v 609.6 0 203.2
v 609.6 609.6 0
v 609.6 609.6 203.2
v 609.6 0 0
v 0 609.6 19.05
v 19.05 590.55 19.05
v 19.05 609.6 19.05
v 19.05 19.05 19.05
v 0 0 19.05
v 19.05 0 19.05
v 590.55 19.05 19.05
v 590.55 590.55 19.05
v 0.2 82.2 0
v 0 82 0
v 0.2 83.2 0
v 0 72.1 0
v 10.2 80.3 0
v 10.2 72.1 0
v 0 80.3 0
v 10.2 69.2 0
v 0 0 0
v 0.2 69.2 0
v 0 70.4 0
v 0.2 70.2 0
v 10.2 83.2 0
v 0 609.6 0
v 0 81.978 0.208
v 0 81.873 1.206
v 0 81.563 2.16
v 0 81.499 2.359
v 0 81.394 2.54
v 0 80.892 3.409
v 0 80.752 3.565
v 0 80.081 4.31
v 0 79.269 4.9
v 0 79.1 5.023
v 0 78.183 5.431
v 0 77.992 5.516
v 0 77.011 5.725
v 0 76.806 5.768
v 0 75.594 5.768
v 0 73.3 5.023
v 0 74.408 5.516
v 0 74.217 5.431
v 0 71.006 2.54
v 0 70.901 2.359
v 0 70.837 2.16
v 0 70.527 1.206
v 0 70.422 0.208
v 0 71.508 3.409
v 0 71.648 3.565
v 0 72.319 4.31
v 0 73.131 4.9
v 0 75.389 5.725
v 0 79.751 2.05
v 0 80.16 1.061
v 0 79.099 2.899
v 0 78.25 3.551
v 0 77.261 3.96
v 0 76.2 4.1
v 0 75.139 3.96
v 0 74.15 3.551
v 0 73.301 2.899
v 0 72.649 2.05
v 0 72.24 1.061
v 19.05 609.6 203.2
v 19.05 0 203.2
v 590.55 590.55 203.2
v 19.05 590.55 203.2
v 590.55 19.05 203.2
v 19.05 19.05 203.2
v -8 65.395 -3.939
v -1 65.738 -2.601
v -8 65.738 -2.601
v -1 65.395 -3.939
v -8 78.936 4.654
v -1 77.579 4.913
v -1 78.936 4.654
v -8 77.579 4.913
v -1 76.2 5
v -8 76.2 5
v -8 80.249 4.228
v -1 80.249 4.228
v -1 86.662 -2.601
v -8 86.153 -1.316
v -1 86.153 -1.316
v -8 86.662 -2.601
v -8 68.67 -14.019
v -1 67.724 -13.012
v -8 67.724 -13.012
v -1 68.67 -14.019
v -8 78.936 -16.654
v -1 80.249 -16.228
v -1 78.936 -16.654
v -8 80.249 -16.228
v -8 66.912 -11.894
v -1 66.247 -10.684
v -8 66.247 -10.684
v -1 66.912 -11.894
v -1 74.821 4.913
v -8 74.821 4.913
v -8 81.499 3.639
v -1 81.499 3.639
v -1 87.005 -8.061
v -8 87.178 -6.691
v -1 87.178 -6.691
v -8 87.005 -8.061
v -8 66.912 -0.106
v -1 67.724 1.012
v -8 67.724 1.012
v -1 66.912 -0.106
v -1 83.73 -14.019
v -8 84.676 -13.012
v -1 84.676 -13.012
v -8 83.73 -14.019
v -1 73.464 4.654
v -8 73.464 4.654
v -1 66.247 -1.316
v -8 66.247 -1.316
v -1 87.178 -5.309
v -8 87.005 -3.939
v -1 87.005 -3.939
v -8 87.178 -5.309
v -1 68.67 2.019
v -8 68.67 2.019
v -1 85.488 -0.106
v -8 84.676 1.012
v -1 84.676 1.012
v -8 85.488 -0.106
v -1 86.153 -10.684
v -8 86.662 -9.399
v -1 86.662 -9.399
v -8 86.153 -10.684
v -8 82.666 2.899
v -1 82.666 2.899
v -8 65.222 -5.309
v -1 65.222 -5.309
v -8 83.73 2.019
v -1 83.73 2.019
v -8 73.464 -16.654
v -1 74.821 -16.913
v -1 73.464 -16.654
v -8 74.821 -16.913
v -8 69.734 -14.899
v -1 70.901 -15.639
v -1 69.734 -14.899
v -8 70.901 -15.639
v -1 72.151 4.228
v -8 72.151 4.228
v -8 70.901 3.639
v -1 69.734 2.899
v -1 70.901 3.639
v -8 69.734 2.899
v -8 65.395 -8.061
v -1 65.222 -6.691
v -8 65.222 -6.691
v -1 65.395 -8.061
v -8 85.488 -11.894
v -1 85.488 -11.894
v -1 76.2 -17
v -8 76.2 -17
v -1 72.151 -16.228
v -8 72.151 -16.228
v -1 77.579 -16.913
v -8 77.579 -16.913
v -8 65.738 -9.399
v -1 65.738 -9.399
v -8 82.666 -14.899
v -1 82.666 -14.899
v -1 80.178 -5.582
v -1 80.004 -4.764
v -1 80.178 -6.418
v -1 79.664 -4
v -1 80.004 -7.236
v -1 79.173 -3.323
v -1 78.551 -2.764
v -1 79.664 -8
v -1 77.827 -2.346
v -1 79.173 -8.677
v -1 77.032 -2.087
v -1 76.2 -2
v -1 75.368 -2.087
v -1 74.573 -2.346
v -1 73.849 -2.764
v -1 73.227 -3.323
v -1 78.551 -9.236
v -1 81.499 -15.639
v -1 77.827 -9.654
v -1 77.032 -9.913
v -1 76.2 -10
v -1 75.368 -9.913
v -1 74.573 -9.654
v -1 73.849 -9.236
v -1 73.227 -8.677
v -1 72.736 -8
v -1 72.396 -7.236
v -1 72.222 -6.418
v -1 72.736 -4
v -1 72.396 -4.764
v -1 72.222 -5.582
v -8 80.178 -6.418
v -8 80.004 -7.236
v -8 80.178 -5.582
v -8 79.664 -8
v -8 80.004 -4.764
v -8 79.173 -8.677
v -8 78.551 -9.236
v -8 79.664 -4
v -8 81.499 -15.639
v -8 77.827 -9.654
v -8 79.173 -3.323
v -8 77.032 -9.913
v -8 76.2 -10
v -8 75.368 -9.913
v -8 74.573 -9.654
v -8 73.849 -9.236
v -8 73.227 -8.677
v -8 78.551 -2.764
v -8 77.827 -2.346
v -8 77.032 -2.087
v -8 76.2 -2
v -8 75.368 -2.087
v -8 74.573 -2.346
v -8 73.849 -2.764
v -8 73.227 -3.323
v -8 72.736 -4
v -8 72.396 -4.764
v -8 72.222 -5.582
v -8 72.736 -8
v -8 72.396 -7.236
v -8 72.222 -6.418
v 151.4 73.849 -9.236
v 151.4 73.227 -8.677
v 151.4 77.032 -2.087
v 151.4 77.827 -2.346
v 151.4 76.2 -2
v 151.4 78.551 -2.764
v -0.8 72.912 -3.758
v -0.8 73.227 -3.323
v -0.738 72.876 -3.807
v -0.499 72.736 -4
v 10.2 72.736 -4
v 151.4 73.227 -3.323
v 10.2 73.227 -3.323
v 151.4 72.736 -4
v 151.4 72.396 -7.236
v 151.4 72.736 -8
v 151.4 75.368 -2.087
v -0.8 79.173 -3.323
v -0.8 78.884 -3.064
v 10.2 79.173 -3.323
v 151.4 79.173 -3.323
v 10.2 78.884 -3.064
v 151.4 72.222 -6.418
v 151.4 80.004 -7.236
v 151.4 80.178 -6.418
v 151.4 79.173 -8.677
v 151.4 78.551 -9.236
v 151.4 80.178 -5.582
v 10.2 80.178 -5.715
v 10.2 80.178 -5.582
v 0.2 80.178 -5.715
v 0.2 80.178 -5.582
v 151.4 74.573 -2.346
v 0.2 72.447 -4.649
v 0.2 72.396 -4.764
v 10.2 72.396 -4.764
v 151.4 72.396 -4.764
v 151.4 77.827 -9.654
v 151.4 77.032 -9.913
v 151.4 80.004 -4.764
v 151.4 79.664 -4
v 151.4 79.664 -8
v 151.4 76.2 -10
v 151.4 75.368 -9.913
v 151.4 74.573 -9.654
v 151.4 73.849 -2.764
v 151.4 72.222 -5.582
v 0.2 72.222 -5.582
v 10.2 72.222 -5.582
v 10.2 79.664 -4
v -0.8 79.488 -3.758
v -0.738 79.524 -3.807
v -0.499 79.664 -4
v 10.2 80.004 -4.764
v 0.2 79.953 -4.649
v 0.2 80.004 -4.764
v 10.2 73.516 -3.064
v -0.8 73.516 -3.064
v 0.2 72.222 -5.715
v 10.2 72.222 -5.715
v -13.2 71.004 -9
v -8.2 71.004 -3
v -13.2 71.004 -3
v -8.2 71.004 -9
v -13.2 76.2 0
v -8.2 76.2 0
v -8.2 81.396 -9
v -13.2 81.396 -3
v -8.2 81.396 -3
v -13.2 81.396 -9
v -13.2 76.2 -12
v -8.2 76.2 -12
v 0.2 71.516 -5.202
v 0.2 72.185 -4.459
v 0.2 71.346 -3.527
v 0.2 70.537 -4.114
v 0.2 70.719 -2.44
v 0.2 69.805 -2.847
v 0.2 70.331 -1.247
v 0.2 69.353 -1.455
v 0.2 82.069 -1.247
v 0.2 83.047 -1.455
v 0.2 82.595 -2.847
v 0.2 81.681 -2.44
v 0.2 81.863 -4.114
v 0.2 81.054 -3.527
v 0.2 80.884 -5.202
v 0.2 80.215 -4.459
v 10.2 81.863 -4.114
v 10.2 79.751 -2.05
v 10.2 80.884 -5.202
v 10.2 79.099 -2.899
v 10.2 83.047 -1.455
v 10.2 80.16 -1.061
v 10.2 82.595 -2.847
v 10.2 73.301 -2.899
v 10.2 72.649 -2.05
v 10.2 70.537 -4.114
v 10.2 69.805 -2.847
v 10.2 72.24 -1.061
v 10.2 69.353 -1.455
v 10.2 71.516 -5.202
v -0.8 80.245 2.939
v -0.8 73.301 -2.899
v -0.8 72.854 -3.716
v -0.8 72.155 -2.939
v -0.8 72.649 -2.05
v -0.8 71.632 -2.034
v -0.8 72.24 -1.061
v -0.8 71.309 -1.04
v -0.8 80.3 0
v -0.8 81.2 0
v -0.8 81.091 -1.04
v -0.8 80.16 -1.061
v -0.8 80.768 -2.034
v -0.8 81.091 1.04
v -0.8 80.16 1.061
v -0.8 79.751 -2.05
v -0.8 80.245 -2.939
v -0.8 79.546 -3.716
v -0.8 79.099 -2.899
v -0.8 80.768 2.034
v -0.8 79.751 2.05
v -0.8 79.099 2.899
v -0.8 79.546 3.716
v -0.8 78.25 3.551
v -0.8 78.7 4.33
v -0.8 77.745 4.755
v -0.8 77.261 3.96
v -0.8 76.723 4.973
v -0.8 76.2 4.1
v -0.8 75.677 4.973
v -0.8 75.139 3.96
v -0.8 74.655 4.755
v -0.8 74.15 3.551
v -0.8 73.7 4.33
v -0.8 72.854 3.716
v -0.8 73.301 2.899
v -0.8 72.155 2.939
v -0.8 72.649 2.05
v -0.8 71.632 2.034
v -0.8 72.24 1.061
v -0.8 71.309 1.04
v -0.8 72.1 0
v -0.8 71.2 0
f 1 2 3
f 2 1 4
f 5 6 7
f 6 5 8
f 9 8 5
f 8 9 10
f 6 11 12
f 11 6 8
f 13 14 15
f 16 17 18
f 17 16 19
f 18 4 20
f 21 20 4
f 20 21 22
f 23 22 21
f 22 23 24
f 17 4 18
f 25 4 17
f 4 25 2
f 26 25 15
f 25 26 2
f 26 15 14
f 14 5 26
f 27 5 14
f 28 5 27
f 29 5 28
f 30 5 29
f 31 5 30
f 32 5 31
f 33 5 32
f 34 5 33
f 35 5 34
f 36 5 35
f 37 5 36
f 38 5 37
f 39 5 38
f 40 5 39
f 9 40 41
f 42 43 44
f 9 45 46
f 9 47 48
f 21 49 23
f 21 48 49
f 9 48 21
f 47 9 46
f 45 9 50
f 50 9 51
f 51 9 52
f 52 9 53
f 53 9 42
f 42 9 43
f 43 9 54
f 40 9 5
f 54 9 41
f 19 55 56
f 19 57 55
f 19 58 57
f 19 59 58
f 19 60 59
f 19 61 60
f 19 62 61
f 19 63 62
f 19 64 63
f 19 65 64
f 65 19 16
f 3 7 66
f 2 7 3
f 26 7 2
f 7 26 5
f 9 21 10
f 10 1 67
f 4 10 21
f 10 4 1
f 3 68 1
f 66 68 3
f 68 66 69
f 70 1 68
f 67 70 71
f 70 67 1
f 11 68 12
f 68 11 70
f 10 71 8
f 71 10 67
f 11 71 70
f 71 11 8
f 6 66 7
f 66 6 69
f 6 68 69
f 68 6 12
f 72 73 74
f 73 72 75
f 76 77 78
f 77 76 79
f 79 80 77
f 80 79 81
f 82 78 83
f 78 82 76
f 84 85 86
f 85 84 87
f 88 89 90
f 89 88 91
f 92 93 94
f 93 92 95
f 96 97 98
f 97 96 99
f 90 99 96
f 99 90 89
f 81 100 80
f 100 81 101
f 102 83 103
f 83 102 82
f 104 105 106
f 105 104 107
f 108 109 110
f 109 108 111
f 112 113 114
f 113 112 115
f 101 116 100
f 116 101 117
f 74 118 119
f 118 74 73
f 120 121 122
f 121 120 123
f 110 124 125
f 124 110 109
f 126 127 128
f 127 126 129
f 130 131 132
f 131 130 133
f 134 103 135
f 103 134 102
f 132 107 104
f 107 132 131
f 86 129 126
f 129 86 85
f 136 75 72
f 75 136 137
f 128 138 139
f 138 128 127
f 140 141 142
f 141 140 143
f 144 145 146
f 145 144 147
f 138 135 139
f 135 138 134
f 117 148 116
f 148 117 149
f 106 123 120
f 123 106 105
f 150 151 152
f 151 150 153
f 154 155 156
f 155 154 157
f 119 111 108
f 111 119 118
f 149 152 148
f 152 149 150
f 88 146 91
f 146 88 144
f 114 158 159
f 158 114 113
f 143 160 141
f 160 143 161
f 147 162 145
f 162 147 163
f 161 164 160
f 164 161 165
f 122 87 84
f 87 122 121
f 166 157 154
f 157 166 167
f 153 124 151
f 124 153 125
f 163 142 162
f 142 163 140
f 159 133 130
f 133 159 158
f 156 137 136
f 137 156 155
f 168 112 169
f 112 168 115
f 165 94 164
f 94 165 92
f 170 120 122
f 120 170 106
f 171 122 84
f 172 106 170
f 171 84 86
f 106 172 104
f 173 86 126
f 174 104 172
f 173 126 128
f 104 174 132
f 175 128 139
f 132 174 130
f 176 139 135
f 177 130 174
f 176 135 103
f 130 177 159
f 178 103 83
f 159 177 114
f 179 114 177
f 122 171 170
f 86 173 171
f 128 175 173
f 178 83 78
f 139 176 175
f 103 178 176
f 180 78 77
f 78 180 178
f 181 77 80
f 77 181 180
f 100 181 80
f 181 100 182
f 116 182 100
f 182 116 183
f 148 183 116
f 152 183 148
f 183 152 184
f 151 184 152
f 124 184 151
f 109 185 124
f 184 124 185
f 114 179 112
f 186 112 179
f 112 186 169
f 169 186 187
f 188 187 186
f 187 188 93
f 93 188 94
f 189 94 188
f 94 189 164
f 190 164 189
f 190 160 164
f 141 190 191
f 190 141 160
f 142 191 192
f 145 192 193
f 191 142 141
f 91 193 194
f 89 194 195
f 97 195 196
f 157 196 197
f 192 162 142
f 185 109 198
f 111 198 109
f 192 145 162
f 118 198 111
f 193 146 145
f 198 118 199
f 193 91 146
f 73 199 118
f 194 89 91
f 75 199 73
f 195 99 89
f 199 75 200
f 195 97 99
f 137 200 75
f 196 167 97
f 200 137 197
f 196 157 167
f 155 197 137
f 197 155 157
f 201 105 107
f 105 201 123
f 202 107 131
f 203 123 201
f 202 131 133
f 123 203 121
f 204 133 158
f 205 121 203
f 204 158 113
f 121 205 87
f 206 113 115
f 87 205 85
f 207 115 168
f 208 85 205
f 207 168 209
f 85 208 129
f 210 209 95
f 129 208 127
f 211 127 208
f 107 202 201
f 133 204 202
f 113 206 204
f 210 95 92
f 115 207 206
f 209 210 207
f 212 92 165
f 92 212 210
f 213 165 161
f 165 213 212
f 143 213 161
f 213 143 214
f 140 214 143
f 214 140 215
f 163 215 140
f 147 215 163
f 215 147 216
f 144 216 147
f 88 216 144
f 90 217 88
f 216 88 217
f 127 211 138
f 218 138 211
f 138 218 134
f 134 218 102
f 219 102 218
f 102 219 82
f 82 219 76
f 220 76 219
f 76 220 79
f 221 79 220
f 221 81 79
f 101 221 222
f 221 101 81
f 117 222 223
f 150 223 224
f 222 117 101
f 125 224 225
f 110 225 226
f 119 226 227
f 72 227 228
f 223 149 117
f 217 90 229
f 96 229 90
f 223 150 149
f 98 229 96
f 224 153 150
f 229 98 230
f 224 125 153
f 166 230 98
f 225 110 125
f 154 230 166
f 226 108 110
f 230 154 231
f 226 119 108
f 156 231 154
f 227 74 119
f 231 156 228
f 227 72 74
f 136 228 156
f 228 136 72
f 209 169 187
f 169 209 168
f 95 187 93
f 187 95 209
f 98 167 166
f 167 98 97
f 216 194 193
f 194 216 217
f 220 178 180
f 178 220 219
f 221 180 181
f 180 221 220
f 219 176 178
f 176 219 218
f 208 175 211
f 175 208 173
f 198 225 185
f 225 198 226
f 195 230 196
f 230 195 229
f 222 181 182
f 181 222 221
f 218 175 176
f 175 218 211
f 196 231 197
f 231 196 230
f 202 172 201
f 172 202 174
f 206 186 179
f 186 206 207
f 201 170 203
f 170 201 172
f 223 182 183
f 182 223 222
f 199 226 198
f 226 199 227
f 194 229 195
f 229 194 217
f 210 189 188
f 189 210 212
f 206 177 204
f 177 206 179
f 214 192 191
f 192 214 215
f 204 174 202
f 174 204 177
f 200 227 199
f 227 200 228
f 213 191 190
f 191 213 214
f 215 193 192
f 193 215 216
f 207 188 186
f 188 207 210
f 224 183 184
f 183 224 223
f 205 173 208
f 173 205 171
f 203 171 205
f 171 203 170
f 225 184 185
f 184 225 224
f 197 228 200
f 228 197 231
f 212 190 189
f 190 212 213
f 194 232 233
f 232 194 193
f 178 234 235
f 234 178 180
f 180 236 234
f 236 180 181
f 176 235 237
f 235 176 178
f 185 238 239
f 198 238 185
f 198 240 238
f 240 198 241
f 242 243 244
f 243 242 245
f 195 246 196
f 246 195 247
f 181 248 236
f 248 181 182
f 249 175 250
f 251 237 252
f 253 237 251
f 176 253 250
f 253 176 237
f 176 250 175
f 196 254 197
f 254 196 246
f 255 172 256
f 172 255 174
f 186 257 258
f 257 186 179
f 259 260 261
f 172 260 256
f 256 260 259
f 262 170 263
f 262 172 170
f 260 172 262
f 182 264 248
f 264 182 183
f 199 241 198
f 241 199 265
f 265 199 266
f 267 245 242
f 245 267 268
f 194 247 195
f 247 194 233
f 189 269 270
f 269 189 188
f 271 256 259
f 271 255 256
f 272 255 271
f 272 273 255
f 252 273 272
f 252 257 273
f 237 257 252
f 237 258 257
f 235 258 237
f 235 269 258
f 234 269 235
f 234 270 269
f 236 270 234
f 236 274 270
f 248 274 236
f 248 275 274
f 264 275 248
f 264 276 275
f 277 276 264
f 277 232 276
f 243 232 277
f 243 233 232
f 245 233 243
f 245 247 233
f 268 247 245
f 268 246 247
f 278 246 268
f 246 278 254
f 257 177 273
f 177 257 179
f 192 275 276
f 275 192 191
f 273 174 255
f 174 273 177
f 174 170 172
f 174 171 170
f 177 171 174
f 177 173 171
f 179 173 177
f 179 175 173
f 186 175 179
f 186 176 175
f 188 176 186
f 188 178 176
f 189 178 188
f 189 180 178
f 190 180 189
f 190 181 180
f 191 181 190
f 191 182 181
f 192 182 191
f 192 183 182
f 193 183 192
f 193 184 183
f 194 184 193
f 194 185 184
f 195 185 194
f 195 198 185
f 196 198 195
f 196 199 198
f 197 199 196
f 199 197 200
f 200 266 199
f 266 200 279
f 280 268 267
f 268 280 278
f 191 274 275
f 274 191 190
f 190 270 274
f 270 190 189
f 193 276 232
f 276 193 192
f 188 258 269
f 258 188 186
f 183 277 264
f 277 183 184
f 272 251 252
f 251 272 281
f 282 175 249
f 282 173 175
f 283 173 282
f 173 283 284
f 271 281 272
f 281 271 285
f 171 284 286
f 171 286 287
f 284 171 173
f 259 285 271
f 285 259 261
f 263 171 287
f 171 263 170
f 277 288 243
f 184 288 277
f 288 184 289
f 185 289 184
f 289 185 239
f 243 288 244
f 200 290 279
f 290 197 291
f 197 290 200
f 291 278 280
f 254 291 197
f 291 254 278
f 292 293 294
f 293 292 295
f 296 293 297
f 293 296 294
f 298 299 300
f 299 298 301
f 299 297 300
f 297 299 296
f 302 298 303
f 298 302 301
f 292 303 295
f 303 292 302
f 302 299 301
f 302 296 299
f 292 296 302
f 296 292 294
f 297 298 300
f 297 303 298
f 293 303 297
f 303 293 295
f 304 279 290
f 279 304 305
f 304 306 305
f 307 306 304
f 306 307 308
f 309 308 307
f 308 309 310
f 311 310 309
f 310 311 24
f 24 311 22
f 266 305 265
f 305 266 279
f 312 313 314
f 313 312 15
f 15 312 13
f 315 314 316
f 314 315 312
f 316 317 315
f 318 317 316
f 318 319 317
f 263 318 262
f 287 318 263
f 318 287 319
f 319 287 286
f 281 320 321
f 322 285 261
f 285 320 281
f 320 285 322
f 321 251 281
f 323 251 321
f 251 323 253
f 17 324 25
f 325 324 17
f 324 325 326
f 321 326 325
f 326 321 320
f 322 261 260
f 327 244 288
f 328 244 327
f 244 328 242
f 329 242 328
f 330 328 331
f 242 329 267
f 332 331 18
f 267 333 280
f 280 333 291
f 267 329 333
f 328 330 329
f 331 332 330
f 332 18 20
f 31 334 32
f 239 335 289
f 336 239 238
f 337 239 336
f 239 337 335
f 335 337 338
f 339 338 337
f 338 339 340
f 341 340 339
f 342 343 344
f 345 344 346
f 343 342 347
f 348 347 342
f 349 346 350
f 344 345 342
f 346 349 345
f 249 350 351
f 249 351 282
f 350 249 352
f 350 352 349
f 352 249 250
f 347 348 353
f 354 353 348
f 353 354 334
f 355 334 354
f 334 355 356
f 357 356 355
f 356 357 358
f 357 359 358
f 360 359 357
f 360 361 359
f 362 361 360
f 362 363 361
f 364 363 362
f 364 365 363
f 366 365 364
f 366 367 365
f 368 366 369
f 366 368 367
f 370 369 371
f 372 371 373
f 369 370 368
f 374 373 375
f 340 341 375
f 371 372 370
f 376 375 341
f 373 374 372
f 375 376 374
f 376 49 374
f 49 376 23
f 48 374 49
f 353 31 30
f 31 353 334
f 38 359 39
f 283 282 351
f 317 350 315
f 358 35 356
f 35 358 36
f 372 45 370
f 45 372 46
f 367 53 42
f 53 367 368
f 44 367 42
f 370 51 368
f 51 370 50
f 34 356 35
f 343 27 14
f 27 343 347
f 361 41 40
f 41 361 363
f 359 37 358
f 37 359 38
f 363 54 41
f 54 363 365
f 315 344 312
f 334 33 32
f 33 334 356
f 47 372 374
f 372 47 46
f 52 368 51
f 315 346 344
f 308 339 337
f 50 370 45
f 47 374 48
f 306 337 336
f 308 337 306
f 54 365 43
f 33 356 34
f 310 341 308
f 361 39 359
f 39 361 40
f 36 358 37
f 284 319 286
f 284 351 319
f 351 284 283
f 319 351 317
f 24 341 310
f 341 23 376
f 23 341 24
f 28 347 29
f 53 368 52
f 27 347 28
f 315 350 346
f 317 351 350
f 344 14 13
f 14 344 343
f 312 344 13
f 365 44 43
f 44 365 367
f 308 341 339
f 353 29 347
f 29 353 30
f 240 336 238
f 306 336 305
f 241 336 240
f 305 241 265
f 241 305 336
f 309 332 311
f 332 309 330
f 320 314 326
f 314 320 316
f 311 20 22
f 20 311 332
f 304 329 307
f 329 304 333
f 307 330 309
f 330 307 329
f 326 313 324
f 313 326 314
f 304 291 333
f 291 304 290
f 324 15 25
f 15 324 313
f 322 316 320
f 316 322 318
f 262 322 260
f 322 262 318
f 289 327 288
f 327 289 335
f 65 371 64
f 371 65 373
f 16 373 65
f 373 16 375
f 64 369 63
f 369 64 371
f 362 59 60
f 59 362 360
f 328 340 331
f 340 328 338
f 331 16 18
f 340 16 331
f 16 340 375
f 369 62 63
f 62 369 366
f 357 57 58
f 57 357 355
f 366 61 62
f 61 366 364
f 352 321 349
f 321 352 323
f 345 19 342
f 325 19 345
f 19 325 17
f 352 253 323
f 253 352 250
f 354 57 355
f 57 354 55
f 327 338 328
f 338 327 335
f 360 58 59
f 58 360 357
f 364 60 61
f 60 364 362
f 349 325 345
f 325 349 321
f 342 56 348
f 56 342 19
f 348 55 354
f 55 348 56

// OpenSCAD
in=25.4;
ft=12*in;
tq=in*3/4;
openbox(2*ft,2*ft,8*in);
translate([-1,3*in,-6]) rotate([0,-90])
{
  difference() {
    cylinder(d=22,h=7,$fn=50);
    translate([0,0,-.01]) cylinder(d=8,h=7.02,$fn=30);
  }
  translate([0,0,in*-6]) cylinder(d=8,h=6*in,$fn=30);
  translate([0,0,7.2]) cylinder(d=12,h=5,$fn=6);
}
translate([0.2,3*in,-0]) rotate([0,-90]) translate([0,0,-10]) rotate([0,0,-90]) bracket(11);
module bracket(t=9) {
  difference(){
      intersection() {
        translate([-34,-7]) cube([68,13,t]);
        union() {
          translate([0,0,t-1]) cylinder(d1=12,d2=10,h=1,$fn=30);
          translate([-18,0]) cube([36,6,t-1]);
            mirrorx() translate([-18,6]) cylinder(r=6,h=t-1,$fn=40);
          cylinder(d=14,h=t-1,$fn=30);
        }
      }
    mirrorx() translate([-13.5,-.01,(t-1)/2]) rotate([-90,0]) {
      cylinder(d=4,h=6.02,$fn=20);
      translate([0,0,0]) cylinder(d1=8,d2=4,h=2,$fn=30);
    }
    translate([0,0,-.01]) cylinder(d=8.2,h=t+.02,$fn=24);
  }
}
module mirrorx(offset=0)
{
  translate([0,offset]) for(m=[0,1]) mirror([m,0]) translate([0,offset*-1]) children();
}
module openbox(w,d,h,t=tq)
{
  #cube([w,d,t]);
  *translate([0,0,t]) cube([t,d,h-t]);
  translate([w-t,0,t]) cube([t,d,h-t]);
  translate([t,0,t]) cube([w-t*2,t,h-t]);
  translate([t,d-t,t]) cube([w-t*2,t,h-t]);
}
